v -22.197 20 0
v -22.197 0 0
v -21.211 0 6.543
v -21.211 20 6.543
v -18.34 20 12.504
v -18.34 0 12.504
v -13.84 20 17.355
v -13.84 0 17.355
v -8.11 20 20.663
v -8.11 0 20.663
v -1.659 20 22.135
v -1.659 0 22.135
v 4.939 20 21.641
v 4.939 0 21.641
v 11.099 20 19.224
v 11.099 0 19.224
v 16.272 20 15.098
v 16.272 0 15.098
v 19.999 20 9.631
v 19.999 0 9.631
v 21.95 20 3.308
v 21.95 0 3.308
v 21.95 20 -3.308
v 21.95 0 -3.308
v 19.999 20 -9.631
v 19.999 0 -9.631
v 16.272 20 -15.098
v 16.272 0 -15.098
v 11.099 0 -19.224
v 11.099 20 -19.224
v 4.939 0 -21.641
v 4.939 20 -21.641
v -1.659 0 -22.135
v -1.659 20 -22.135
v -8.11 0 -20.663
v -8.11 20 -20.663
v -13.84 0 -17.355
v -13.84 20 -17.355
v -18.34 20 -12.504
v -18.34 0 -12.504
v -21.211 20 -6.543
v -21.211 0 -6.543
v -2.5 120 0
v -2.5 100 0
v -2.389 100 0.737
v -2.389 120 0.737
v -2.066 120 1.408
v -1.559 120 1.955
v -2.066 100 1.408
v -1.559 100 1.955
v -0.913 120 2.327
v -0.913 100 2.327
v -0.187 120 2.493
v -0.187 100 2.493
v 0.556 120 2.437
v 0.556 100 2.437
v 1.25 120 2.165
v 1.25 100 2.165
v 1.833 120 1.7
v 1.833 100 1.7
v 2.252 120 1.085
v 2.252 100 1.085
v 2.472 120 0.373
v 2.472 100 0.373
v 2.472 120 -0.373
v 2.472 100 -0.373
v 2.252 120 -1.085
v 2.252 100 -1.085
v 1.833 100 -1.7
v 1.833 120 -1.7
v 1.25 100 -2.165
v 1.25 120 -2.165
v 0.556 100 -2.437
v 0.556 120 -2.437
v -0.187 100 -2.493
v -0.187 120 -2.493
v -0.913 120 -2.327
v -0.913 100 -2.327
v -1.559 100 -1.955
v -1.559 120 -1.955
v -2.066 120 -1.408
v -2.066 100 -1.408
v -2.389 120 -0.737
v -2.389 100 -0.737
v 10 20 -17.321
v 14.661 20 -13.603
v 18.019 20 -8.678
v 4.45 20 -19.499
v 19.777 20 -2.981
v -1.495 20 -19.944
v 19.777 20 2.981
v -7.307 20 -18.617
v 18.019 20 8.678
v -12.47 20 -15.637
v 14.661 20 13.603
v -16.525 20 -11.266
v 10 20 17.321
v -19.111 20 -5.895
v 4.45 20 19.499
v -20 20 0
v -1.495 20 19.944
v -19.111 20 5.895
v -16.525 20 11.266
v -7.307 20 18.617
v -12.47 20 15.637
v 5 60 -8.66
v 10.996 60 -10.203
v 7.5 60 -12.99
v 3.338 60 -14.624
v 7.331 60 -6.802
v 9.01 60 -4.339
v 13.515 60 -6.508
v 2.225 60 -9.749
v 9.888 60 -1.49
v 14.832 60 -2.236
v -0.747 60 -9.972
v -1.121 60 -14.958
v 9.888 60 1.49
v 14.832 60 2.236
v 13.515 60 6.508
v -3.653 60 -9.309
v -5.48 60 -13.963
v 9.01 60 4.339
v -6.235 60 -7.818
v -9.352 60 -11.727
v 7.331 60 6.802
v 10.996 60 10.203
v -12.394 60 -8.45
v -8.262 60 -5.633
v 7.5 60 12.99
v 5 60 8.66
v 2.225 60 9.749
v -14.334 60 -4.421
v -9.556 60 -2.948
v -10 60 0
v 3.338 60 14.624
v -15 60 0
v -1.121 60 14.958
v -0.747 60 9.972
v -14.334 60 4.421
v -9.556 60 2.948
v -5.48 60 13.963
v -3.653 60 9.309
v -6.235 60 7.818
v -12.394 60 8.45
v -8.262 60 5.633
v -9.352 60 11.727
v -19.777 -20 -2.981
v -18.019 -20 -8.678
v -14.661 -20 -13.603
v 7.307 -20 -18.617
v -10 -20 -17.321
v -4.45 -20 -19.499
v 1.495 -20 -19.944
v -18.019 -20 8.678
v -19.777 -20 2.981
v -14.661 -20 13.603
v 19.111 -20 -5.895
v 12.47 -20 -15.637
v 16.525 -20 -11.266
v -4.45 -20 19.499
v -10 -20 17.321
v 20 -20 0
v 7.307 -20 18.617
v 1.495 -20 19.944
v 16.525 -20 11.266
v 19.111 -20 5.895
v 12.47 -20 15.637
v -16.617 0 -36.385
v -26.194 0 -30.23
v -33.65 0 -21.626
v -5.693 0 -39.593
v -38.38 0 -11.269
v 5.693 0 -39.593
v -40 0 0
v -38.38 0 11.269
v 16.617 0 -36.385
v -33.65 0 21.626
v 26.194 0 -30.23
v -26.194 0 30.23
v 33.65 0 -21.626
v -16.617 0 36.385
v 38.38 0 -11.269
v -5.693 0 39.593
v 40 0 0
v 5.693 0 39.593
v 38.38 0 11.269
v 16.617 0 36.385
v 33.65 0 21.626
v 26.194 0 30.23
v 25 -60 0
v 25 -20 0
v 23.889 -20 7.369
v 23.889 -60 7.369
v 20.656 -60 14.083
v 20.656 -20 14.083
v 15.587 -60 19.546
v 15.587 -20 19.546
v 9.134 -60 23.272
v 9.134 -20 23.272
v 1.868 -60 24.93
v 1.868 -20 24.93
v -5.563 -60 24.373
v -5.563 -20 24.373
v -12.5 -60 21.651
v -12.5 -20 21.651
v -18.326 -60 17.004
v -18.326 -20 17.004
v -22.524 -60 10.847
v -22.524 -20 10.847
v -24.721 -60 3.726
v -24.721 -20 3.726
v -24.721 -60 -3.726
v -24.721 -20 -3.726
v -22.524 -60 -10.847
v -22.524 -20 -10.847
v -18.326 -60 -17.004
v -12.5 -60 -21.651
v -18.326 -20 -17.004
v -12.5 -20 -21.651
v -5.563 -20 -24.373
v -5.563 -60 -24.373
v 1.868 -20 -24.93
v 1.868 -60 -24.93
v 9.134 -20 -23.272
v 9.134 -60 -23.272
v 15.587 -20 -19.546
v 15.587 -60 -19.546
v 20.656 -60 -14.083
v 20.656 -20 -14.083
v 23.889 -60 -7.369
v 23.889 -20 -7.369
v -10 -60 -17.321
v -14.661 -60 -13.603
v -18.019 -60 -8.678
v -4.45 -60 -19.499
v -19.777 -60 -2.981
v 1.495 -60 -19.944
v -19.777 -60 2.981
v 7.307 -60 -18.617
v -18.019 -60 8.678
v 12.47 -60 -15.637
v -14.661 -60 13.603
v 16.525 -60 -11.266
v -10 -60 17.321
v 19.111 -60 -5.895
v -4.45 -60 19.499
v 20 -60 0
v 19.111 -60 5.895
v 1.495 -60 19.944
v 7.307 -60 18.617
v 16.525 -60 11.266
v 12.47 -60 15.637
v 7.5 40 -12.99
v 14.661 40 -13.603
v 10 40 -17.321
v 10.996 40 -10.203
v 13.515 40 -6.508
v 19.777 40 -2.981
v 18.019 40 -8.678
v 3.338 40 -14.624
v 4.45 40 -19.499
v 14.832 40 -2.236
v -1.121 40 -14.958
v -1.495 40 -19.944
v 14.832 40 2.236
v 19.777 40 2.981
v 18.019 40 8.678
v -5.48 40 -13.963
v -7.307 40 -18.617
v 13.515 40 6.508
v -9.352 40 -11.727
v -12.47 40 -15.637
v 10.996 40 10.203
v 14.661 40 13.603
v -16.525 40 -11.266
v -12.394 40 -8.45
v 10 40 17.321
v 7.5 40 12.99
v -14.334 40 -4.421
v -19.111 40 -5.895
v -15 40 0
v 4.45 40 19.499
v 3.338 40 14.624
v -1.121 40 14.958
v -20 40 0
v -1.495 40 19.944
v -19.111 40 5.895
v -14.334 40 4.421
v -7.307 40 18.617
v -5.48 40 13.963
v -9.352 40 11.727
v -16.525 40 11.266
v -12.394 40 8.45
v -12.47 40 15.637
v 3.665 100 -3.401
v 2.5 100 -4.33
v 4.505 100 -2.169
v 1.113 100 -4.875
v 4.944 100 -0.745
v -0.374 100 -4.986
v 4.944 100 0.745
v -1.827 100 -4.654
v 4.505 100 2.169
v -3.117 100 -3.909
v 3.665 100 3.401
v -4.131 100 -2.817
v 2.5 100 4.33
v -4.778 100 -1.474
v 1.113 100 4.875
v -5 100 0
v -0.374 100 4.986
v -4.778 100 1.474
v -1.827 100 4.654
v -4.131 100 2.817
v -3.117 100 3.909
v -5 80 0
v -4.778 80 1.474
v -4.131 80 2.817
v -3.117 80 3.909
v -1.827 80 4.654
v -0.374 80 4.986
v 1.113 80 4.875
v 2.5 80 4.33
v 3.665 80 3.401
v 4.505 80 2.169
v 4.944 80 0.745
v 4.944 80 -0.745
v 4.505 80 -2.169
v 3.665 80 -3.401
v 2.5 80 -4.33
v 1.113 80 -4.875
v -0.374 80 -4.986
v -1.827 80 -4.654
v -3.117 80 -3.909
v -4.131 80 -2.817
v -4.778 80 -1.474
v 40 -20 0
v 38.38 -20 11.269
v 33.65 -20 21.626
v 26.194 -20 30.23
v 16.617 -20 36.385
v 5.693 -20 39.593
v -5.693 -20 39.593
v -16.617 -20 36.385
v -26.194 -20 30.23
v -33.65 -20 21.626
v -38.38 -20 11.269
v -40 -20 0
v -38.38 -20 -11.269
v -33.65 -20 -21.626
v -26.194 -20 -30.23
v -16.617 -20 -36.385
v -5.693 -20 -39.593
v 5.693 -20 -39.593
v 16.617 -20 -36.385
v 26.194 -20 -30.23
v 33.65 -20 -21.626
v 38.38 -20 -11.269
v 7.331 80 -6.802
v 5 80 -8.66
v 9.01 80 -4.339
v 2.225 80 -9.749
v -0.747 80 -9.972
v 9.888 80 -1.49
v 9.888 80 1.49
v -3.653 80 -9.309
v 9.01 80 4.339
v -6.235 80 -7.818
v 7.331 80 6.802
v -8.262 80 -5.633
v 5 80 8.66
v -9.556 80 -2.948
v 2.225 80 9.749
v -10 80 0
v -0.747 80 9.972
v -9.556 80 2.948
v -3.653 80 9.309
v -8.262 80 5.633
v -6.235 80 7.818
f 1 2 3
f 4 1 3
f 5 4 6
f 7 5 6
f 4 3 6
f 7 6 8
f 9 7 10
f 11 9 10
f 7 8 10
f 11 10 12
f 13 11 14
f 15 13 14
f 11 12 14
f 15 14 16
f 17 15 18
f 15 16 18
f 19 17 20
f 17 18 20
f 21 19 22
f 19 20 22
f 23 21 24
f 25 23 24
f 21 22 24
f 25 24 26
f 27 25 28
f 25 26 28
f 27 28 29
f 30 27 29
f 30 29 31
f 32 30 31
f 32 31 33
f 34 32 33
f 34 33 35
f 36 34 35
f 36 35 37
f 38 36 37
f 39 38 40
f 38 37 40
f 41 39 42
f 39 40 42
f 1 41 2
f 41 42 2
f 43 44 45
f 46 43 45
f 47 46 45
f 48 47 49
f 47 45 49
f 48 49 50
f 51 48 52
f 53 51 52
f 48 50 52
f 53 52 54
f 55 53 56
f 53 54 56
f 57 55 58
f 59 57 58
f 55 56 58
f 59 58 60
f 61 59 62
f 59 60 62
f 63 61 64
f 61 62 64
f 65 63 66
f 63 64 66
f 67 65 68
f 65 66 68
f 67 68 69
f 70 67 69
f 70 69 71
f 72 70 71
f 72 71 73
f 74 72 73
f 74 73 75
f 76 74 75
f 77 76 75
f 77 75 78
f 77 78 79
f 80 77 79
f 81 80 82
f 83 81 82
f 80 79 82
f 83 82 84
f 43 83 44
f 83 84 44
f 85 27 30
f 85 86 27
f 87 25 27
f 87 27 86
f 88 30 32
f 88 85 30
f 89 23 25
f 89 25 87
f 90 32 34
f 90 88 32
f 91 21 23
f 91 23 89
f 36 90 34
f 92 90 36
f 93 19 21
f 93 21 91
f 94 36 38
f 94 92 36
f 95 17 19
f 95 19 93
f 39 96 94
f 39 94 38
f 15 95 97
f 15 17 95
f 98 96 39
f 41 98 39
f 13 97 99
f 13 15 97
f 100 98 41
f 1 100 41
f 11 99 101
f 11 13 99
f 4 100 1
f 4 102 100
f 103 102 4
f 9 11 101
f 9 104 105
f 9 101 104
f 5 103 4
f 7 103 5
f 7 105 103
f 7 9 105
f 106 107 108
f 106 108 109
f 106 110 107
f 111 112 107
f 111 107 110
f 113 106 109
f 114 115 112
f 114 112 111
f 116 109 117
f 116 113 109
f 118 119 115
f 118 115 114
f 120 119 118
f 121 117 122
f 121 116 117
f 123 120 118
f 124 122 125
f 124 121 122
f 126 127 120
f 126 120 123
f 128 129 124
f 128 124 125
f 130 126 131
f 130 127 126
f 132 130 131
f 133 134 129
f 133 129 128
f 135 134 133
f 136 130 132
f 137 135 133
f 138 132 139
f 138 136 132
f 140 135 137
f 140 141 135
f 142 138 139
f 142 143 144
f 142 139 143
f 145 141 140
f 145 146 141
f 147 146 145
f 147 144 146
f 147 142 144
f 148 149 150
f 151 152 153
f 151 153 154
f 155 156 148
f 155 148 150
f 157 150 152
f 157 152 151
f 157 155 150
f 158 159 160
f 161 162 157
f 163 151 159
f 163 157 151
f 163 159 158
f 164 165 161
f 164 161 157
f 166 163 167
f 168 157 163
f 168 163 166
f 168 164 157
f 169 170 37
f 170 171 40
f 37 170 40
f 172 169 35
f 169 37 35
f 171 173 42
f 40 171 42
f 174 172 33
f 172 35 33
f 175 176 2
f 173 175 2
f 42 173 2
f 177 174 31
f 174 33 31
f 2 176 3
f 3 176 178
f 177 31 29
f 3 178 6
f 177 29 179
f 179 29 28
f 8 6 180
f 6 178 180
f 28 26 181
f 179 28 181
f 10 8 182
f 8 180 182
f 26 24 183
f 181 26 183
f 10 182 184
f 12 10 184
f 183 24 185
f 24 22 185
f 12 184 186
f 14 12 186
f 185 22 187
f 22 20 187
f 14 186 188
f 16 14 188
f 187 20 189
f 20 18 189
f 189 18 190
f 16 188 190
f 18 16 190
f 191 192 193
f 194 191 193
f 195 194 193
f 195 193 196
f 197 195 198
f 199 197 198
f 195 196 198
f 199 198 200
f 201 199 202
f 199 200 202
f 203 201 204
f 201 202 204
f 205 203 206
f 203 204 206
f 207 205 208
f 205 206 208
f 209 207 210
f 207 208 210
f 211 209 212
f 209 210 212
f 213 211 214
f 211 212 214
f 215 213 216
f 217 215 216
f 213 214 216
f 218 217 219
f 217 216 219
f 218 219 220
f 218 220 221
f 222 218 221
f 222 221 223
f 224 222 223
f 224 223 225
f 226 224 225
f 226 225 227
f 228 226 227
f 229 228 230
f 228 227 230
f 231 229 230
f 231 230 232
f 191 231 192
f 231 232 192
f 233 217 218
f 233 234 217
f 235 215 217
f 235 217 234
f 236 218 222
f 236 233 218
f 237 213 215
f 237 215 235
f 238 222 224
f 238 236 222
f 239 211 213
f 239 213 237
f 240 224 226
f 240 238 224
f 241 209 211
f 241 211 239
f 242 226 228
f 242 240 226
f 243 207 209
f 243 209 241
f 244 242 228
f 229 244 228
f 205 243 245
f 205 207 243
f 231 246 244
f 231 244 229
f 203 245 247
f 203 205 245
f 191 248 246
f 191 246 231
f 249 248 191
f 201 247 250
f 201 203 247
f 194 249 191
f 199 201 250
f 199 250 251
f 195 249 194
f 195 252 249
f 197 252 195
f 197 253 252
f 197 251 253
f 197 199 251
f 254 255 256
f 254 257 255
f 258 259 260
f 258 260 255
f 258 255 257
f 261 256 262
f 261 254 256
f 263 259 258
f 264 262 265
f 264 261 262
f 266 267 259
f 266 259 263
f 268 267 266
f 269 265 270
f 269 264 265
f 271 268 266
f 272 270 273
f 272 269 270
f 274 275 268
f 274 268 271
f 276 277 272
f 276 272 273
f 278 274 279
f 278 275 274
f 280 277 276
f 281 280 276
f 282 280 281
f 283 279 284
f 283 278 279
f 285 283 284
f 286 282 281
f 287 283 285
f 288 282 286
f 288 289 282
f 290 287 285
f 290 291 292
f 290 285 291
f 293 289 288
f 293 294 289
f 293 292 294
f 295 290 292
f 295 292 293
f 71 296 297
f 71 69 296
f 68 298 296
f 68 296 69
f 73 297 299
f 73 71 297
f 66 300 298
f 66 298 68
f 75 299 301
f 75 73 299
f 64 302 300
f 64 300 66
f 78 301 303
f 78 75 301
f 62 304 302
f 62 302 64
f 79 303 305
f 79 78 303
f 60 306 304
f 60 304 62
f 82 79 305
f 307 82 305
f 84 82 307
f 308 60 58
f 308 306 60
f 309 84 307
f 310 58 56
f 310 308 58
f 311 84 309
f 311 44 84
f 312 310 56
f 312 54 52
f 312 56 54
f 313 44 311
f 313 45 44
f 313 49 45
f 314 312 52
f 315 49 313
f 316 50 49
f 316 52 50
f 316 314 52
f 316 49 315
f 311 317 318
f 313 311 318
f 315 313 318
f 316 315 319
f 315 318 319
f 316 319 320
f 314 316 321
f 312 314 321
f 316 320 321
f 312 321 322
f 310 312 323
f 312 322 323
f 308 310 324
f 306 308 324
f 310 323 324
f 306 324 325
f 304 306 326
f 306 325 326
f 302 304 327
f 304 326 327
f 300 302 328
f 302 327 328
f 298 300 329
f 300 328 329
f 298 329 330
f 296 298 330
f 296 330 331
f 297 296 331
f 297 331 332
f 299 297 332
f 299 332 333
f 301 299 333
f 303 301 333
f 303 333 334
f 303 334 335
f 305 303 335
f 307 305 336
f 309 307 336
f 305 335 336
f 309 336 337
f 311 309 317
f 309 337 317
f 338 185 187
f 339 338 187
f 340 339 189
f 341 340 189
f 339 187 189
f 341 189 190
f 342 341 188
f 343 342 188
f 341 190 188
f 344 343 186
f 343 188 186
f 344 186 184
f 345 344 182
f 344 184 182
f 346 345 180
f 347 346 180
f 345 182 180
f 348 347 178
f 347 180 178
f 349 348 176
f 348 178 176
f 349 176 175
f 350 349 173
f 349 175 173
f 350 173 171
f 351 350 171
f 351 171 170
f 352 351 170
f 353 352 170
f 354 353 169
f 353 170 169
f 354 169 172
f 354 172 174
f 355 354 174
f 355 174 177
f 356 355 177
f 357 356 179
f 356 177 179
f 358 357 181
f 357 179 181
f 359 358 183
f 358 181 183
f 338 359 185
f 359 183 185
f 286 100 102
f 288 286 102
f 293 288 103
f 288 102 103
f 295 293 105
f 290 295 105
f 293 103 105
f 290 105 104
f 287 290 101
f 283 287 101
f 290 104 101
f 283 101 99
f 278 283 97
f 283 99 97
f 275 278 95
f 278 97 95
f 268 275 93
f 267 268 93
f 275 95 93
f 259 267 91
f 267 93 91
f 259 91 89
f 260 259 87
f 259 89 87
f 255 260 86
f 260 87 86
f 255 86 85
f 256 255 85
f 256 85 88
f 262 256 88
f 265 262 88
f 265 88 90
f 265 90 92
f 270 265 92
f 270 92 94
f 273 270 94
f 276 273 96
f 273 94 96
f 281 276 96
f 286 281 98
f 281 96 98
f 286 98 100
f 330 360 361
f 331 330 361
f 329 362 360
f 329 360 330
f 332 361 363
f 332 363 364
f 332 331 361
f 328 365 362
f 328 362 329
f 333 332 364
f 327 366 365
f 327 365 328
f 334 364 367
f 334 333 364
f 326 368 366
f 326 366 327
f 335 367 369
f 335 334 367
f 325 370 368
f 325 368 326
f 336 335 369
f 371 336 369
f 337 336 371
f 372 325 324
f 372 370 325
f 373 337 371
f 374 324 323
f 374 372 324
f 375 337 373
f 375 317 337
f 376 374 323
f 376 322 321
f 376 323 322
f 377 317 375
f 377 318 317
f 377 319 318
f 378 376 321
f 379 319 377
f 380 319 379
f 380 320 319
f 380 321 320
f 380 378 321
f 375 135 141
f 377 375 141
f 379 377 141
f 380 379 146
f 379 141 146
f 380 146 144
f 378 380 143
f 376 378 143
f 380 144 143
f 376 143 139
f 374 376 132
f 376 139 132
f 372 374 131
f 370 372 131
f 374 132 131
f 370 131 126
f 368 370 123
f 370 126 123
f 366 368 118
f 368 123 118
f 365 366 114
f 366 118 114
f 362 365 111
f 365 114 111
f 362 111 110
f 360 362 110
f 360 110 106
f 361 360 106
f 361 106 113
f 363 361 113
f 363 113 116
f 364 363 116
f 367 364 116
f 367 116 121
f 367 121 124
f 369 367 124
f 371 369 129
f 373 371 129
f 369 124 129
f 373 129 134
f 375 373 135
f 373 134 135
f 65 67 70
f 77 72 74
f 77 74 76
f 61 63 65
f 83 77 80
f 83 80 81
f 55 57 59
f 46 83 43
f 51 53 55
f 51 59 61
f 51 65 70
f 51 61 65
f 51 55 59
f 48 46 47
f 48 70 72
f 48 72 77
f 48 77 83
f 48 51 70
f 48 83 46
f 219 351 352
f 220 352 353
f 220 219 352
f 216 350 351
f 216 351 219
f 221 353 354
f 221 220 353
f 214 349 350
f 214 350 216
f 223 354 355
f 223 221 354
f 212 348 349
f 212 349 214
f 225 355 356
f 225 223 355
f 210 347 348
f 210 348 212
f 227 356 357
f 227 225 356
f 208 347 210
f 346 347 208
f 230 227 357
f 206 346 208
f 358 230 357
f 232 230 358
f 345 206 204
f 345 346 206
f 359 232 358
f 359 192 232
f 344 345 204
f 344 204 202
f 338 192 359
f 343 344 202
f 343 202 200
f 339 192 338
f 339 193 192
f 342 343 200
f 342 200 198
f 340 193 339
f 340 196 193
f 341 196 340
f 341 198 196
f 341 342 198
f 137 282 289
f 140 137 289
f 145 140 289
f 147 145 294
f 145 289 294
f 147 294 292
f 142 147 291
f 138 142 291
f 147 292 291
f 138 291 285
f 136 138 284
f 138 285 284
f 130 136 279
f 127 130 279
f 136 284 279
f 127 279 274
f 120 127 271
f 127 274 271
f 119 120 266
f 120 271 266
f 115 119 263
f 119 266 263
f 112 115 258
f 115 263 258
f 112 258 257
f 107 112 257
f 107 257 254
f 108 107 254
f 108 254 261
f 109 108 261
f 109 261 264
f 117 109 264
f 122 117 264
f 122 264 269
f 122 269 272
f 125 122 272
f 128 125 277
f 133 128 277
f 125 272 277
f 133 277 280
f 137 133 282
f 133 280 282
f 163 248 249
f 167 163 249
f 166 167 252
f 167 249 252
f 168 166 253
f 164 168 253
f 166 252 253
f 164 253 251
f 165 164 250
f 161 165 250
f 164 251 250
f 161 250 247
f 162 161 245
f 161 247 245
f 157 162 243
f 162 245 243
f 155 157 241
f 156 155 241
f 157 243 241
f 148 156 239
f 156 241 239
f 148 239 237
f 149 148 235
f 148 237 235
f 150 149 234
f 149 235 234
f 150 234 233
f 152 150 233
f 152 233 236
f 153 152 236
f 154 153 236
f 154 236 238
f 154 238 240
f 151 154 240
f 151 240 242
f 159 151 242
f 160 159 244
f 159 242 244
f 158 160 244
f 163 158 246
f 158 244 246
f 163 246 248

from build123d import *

# Parameters (mm, degrees)
F0_R      = 40
F1_DEPTH  = 20
F2_R      = 25
F3_DEPTH  = 40
F4_R      = 20
F5_DEPTH  = 40
F6_R      = 22.1974572785
F7_DEPTH  = 20
F8_R      = 20
F9_DEPTH  = 20
F10_R     = 15
F11_DEPTH = 20
F12_R     = 10
F13_DEPTH = 20
F14_R     = 5
F15_DEPTH = 20
F16_R     = 2.5
F17_DEPTH = 20


with BuildPart() as f1:
    # F0 (on Front) → F1 (new body)
    with BuildSketch(Plane.XZ):
        Circle(F0_R)
    extrude(amount=F1_DEPTH)

    # F2 (on face) → F3 (join)
    with BuildSketch(Plane.XZ.offset(20)):
        Circle(F2_R)
    extrude(amount=F3_DEPTH)

    # F4 (on face) → F5 (cut)
    with BuildSketch(Plane.XZ.offset(60)):
        Circle(F4_R)
    extrude(amount=-F5_DEPTH, mode=Mode.SUBTRACT)

    # F6 (on face) → F7 (join)
    with BuildSketch(Plane(origin=(0, 0, 0), x_dir=(-1, 0, 0), z_dir=(0, 1, 0))):
        Circle(F6_R)
    extrude(amount=F7_DEPTH)

    # F8 (on face) → F9 (join)
    with BuildSketch(Plane(origin=(0, 20, 0), x_dir=(-1, 0, 0), z_dir=(0, 1, 0))):
        Circle(F8_R)
    extrude(amount=F9_DEPTH)

    # F10 (on face) → F11 (join)
    with BuildSketch(Plane(origin=(0, 40, 0), x_dir=(-1, 0, 0), z_dir=(0, 1, 0))):
        Circle(F10_R)
    extrude(amount=F11_DEPTH)

    # F12 (on face) → F13 (join)
    with BuildSketch(Plane(origin=(0, 60, 0), x_dir=(-1, 0, 0), z_dir=(0, 1, 0))):
        Circle(F12_R)
    extrude(amount=F13_DEPTH)

    # F14 (on face) → F15 (join)
    with BuildSketch(Plane(origin=(0, 80, 0), x_dir=(-1, 0, 0), z_dir=(0, 1, 0))):
        Circle(F14_R)
    extrude(amount=F15_DEPTH)

    # F16 (on face) → F17 (join)
    with BuildSketch(Plane(origin=(0, 100, 0), x_dir=(-1, 0, 0), z_dir=(0, 1, 0))):
        Circle(F16_R)
    extrude(amount=F17_DEPTH)


solid = f1.part
